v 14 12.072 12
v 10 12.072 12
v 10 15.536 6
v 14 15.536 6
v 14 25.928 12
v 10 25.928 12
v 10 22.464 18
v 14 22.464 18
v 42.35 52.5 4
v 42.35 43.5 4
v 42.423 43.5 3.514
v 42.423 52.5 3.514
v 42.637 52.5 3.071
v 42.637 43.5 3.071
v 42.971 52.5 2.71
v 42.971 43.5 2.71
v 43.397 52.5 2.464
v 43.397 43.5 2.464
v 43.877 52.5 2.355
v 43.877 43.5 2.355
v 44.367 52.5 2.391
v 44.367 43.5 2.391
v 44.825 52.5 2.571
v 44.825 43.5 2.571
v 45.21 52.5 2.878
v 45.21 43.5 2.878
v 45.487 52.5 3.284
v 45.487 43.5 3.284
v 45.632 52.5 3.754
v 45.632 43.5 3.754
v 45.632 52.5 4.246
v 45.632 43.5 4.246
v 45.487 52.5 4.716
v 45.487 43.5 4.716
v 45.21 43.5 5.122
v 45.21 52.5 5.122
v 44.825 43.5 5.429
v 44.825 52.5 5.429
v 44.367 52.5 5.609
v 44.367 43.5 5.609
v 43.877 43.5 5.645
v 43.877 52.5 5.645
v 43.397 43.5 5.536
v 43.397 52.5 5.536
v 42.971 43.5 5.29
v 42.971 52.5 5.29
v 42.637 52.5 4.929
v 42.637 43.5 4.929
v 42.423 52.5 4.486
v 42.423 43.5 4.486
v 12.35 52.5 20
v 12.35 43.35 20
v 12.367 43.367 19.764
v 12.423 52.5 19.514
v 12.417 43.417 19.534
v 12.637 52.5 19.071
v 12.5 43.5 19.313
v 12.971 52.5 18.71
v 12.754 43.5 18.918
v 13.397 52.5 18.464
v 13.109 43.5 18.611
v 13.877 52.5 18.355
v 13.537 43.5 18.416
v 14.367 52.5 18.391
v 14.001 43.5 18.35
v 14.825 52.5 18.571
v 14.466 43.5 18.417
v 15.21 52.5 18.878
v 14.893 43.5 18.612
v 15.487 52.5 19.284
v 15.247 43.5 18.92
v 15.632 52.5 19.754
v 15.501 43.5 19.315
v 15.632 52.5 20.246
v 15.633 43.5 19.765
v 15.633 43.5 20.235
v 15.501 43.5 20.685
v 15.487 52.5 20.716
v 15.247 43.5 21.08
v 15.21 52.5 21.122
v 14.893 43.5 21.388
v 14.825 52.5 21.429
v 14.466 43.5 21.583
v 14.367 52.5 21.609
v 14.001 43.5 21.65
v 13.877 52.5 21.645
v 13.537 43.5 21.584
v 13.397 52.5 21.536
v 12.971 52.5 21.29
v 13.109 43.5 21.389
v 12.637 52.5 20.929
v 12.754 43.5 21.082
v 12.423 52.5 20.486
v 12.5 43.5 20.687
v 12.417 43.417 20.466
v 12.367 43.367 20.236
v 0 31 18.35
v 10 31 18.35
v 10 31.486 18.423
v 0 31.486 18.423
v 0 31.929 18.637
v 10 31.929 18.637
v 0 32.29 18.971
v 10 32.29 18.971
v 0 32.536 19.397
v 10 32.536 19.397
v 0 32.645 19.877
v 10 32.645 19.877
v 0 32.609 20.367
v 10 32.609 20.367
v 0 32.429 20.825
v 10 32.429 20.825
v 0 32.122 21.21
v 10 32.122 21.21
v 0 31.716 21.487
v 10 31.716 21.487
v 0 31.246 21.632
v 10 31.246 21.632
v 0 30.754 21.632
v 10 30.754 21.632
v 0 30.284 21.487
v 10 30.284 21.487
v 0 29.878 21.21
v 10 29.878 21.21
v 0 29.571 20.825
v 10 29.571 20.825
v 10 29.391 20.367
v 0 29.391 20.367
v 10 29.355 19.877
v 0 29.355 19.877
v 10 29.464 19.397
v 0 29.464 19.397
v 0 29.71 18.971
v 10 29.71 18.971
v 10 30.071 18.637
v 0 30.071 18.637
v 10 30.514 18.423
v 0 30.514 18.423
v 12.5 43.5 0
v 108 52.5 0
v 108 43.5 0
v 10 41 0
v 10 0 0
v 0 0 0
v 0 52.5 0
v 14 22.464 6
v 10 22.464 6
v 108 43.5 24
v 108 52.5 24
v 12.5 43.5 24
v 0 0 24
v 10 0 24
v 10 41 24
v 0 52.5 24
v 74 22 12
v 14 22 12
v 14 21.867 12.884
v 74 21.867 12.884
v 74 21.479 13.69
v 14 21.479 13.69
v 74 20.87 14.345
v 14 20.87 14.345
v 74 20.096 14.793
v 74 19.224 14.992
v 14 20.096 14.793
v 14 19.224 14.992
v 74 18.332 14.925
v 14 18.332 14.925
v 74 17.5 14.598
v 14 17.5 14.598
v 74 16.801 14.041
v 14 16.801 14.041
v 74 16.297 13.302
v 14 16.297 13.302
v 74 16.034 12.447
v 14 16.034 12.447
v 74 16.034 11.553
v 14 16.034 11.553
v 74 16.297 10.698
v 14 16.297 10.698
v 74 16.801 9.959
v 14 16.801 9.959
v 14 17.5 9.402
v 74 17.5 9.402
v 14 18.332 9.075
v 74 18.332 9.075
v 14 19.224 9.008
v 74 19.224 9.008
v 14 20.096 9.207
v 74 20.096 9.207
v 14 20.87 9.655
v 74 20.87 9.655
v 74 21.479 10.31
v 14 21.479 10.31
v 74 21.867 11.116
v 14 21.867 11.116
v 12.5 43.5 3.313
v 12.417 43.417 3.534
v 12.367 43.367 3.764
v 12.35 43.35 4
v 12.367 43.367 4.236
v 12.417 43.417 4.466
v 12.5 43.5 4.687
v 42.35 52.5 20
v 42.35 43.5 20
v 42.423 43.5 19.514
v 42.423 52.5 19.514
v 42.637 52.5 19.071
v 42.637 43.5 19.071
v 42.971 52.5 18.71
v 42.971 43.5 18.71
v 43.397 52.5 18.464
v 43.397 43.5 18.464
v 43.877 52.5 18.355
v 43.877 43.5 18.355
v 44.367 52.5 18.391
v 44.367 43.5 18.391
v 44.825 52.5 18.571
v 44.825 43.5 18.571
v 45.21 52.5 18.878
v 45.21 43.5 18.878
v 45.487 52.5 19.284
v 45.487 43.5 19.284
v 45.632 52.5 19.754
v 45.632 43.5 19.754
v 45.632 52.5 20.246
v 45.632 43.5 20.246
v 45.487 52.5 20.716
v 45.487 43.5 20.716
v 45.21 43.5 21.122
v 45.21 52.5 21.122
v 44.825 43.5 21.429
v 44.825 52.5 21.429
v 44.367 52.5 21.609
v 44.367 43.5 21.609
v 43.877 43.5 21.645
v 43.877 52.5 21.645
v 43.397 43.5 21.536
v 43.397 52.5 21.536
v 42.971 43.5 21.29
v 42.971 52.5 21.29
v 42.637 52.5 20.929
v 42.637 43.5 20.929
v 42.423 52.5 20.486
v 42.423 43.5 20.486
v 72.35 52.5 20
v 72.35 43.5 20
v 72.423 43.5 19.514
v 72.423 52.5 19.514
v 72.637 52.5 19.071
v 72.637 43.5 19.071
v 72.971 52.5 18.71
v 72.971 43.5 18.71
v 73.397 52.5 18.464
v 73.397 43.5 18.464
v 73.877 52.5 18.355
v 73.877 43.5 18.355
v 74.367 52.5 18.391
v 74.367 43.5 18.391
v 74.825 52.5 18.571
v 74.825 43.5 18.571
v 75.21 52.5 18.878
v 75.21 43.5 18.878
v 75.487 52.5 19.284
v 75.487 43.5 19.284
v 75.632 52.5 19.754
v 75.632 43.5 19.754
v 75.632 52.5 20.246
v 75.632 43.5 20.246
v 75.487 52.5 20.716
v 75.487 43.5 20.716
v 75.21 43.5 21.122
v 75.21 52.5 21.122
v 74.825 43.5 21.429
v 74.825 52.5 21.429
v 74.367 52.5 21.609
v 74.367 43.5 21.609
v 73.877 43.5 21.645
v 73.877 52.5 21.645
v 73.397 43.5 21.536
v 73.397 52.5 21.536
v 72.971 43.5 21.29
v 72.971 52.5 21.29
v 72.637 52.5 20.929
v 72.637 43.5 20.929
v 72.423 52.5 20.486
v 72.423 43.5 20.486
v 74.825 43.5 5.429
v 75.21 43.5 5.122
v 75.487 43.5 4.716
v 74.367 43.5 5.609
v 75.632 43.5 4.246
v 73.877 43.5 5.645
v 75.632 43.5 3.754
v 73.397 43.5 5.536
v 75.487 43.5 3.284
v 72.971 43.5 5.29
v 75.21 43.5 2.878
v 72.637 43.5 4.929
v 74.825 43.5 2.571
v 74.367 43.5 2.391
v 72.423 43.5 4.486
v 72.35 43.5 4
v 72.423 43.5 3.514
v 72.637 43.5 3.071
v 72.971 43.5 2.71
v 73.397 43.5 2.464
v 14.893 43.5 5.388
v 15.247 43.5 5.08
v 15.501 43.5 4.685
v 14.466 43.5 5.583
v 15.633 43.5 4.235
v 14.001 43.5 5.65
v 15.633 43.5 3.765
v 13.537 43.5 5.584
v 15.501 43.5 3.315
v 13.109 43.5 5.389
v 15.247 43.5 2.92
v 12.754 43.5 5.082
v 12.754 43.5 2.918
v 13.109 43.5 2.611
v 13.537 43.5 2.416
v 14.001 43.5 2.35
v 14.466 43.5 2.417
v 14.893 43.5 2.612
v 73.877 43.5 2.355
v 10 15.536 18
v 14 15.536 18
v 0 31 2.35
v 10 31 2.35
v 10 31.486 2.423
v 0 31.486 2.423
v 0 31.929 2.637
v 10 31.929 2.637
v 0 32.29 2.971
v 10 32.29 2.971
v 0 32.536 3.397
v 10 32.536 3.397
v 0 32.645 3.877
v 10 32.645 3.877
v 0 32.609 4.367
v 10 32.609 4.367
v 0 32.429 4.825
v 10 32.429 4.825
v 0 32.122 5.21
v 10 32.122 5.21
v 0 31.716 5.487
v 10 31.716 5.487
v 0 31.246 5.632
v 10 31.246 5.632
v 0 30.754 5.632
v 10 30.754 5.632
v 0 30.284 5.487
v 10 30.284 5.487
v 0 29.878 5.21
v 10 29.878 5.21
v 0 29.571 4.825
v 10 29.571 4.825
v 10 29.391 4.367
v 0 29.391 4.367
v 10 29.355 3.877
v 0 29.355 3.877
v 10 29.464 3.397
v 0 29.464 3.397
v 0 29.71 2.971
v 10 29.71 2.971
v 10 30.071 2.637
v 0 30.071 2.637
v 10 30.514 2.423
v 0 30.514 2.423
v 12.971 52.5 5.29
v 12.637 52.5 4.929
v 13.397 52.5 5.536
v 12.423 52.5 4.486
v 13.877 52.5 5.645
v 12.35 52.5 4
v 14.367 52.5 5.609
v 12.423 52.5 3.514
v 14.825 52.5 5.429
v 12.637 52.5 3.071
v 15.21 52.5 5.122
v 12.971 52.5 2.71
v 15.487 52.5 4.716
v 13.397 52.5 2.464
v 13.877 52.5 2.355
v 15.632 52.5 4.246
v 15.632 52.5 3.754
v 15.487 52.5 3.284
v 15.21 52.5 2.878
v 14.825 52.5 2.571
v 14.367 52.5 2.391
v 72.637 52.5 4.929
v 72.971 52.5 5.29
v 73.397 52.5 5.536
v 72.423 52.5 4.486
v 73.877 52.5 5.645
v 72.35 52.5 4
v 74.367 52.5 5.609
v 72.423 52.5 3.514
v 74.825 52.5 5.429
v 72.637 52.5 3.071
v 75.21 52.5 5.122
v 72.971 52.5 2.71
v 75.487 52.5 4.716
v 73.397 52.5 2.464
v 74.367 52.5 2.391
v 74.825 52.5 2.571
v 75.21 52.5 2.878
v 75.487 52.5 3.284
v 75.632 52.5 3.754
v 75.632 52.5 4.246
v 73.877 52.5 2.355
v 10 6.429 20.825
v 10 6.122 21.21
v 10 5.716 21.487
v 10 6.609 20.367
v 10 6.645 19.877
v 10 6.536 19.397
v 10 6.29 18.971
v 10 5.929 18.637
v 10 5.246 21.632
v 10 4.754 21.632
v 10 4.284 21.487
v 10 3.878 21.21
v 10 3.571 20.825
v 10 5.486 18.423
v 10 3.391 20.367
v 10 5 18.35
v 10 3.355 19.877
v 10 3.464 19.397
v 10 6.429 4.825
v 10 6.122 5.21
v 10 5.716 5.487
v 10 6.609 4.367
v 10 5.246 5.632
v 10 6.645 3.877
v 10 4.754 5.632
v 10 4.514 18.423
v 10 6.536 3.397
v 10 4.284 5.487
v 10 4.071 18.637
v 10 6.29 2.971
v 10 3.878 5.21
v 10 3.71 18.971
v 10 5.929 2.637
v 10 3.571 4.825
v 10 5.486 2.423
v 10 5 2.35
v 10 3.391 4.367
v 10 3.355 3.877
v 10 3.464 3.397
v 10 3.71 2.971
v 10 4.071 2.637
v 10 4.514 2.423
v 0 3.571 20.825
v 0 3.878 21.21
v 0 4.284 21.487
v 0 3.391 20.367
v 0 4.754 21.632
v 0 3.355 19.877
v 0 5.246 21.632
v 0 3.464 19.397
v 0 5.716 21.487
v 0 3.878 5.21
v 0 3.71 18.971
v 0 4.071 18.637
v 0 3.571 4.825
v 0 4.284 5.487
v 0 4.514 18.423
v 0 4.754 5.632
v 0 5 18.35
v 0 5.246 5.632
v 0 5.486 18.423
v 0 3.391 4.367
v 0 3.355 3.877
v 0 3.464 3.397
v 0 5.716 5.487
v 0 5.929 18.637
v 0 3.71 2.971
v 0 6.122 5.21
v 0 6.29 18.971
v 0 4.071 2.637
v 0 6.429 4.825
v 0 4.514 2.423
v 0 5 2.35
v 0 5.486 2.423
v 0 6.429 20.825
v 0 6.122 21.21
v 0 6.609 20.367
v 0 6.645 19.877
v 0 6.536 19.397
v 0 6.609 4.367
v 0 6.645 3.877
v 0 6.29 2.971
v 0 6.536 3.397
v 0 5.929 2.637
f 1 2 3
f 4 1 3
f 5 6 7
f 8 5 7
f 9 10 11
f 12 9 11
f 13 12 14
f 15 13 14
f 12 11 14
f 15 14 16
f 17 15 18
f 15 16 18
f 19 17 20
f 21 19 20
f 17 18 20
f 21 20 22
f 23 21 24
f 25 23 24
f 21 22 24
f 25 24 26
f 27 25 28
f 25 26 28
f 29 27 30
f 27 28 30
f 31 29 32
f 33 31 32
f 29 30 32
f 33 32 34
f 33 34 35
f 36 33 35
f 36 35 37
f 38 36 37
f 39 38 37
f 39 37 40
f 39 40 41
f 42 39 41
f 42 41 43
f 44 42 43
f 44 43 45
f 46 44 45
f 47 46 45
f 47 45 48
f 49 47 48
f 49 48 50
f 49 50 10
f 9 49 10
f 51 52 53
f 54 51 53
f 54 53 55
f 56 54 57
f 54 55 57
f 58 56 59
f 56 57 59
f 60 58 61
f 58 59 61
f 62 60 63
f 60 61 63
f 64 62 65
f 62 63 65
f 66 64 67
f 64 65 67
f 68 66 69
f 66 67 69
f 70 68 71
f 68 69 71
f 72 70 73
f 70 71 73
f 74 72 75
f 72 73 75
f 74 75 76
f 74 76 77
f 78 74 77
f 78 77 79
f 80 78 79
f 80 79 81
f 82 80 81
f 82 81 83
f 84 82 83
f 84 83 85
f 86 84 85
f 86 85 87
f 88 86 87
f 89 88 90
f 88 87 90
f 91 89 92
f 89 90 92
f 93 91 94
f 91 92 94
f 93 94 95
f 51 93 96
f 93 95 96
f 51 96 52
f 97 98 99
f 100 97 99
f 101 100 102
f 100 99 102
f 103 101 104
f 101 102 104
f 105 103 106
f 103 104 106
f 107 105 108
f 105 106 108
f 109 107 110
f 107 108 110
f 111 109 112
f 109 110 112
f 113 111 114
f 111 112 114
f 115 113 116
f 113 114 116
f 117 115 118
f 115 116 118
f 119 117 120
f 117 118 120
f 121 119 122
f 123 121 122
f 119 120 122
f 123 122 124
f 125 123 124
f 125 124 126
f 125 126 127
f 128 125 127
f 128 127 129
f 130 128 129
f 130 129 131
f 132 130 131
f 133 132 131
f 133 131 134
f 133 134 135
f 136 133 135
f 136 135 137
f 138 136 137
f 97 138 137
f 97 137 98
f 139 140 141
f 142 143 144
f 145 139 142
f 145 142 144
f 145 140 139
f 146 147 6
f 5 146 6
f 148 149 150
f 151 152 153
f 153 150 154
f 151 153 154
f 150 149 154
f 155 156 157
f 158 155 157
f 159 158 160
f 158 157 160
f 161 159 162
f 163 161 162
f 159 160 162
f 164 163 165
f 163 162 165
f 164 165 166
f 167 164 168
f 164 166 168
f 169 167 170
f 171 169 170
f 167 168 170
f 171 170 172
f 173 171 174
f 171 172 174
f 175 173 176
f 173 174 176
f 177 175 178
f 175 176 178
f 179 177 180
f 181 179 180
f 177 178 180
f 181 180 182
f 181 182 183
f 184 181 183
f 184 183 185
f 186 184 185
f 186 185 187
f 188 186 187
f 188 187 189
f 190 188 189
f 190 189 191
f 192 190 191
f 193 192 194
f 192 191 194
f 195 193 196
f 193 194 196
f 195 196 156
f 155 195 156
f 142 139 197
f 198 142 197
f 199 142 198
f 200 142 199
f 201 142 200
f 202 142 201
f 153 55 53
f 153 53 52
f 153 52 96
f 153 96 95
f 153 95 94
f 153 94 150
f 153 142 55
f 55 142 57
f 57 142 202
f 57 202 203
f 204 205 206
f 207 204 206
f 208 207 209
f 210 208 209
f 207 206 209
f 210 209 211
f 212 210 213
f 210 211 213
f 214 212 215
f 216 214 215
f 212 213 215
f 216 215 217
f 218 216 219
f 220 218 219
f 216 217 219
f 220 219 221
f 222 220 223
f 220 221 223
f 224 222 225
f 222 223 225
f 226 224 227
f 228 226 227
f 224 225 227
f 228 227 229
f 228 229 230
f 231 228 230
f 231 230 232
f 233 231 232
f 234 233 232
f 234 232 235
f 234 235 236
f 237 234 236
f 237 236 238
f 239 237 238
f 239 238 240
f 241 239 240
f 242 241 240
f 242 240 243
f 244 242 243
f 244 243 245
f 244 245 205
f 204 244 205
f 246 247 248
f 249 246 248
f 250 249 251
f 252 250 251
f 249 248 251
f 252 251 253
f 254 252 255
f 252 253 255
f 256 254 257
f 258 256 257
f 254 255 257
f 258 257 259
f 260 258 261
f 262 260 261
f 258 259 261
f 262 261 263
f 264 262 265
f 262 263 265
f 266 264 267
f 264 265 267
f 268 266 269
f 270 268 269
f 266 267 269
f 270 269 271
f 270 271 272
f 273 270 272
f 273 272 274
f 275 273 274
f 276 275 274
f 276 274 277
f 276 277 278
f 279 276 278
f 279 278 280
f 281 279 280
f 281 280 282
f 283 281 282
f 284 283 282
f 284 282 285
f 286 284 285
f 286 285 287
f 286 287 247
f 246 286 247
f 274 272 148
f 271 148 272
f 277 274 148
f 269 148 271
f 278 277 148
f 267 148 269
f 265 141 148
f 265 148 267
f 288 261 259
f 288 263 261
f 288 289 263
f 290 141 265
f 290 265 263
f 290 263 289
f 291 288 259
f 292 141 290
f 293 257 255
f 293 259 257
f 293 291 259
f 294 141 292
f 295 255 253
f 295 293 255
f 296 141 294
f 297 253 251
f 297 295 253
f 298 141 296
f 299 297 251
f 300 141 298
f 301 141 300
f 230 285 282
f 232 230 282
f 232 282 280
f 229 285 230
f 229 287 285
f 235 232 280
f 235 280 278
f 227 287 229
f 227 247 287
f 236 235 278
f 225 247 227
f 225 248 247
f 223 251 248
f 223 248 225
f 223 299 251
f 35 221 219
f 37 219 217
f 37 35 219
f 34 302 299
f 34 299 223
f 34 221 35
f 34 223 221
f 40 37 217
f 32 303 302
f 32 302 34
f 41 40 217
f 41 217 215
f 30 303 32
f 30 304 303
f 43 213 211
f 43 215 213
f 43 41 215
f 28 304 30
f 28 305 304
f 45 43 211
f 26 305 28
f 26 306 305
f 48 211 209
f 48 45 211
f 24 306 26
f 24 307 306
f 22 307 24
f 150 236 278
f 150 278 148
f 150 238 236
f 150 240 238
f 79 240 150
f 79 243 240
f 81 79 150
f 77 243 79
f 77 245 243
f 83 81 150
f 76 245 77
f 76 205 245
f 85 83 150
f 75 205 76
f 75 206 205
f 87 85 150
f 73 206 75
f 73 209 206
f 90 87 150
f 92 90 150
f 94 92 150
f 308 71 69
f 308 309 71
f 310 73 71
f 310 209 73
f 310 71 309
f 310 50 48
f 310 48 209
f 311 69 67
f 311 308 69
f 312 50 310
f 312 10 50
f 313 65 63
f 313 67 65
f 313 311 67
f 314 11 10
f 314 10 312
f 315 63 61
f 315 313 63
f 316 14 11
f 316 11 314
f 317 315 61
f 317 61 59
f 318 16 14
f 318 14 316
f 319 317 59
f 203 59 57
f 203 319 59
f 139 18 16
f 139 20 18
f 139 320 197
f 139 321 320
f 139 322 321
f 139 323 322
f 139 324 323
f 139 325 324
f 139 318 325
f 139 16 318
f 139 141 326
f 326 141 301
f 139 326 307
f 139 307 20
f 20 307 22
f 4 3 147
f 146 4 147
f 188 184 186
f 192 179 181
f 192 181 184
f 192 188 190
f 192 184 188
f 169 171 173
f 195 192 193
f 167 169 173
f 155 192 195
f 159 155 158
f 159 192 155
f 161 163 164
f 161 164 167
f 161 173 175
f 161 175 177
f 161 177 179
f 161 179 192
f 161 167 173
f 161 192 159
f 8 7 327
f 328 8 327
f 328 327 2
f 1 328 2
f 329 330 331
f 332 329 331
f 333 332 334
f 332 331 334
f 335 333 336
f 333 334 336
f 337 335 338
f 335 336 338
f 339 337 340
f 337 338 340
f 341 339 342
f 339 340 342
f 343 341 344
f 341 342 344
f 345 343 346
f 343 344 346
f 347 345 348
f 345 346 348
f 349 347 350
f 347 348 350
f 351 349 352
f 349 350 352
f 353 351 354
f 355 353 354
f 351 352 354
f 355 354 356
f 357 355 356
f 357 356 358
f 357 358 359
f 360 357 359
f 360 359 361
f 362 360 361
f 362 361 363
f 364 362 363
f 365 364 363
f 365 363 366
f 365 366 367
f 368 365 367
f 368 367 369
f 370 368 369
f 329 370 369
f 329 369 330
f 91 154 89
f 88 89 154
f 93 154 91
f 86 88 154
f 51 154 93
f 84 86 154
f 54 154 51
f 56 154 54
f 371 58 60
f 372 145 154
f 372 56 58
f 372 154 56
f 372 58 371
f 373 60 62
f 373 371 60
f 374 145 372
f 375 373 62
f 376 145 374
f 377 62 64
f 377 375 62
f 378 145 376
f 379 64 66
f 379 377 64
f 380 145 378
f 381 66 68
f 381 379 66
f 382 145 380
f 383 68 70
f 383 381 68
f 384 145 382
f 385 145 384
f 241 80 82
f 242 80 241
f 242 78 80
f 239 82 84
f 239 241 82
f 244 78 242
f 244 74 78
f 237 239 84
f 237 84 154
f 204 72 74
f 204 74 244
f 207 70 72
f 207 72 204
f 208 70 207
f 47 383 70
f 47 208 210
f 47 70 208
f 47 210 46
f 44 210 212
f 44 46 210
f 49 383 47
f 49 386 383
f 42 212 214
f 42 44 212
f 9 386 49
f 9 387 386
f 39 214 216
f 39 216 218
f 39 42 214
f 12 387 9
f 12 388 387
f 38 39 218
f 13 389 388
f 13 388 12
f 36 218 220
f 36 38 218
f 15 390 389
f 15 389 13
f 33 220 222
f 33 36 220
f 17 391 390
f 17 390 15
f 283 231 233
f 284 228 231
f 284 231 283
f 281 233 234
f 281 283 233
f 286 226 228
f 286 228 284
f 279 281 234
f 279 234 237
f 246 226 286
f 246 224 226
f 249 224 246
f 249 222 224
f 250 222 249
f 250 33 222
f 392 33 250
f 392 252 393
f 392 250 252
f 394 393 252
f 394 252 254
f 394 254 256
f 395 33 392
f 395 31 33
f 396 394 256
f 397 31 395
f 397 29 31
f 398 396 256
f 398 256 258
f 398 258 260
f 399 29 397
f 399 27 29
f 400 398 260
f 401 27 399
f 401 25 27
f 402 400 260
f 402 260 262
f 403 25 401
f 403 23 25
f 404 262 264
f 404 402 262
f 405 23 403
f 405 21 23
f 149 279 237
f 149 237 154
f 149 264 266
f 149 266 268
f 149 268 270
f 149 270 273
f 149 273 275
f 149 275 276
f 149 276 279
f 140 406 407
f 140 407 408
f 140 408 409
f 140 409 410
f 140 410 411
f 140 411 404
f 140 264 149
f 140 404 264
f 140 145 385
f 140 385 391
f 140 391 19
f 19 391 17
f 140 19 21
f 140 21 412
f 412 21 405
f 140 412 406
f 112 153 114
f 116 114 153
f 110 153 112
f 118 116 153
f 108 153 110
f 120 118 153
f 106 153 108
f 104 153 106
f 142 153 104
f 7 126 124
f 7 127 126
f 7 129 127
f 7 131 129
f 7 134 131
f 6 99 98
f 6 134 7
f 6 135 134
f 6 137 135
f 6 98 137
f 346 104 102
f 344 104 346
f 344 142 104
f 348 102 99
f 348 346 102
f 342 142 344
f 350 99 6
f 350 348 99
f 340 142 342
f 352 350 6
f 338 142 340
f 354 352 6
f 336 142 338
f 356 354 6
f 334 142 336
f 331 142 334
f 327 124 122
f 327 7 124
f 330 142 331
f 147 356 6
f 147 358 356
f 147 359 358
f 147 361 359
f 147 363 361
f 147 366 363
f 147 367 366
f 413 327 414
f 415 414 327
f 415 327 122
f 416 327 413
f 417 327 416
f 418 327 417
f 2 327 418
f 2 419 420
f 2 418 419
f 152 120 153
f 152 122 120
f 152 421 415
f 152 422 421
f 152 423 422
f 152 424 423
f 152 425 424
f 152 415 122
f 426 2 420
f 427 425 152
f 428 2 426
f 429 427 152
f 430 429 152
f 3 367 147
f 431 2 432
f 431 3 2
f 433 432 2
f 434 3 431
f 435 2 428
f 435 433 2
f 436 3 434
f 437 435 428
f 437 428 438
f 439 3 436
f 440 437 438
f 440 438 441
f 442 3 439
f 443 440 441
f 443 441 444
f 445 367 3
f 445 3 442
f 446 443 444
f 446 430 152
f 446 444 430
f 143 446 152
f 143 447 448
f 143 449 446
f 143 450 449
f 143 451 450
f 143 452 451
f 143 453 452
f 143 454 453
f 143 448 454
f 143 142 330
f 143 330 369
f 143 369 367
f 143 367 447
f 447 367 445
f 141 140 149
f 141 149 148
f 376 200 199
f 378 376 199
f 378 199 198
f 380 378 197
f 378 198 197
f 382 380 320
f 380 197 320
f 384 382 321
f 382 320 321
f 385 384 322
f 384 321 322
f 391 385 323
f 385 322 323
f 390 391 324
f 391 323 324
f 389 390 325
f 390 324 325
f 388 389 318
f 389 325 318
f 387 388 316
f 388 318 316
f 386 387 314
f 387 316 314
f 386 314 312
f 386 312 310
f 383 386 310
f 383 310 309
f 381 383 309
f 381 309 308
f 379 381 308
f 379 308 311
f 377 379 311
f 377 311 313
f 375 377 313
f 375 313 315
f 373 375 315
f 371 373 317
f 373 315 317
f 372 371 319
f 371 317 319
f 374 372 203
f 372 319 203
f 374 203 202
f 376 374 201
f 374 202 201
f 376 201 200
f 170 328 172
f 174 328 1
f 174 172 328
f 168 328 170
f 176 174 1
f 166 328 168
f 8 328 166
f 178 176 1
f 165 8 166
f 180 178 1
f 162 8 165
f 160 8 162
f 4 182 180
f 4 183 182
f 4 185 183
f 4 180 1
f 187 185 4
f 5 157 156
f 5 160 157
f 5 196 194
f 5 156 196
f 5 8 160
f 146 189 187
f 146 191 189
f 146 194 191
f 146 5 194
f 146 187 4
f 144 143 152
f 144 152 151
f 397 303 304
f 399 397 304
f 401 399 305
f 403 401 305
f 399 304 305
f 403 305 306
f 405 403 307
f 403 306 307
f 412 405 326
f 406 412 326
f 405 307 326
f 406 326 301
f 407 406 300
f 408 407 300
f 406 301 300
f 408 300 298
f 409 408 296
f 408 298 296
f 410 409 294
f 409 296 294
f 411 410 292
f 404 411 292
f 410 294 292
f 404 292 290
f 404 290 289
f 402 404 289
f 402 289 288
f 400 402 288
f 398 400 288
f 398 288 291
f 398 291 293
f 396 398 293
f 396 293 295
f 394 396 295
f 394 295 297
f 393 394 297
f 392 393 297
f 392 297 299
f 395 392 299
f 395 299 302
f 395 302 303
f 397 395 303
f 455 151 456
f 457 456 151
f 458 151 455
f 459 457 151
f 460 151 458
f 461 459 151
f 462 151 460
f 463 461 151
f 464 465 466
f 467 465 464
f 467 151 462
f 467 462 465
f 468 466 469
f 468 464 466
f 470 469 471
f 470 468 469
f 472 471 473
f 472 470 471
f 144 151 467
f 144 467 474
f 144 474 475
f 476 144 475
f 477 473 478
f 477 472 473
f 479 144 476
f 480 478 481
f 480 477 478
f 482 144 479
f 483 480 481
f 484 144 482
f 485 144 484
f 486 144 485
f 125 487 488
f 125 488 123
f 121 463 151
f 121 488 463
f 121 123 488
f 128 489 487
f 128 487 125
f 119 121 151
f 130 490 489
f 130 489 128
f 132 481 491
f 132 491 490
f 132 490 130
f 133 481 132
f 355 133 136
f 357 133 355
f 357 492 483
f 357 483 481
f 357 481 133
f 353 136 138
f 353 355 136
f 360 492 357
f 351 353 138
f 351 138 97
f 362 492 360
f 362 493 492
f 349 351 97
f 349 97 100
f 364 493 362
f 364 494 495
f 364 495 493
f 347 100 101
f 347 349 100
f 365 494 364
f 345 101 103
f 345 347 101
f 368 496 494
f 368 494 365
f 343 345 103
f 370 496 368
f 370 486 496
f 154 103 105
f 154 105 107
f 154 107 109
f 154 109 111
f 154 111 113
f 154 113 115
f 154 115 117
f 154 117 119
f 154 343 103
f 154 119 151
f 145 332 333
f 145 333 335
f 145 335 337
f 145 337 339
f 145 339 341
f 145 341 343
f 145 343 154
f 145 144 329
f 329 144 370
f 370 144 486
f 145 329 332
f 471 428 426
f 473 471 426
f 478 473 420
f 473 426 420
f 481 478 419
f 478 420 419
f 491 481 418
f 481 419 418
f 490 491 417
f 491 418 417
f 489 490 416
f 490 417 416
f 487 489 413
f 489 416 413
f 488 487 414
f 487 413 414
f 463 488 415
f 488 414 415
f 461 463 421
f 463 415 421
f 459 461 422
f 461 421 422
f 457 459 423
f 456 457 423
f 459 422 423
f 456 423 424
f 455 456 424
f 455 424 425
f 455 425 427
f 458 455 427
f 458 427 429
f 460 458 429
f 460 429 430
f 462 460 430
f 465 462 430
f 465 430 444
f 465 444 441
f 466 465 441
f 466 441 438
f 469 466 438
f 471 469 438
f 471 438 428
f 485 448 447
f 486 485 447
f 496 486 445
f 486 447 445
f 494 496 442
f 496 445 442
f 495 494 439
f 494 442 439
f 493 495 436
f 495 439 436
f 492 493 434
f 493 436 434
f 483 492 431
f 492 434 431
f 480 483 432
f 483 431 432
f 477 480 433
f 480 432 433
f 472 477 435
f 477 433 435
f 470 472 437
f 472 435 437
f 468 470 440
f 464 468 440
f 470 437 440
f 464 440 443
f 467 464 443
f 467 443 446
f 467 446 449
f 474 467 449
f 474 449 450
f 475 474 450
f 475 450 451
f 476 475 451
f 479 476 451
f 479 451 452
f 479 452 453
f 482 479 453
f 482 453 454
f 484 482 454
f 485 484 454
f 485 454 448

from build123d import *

# Parameters (mm, degrees)
BOSS_EXTRUDE1_DEPTH       = 24
CHAMFER1_SIZE             = 2.5
BOSS_EXTRUDE2_DEPTH       = 4
SKETCH3_R                 = 3
BOSS_EXTRUDE3_DEPTH       = 60
M4X0_7_TAPPED_HOLE1_D     = 3.3
M4X0_7_TAPPED_HOLE1_DEPTH = 10.1
M4X0_7_TAPPED_HOLE1_TIP   = 0.991420021
M4X0_7_TAPPED_HOLE2_D     = 3.3
M4X0_7_TAPPED_HOLE2_DEPTH = 10.1
M4X0_7_TAPPED_HOLE2_TIP   = 0.991420021


with BuildPart() as part:
    # Sketch1 → Boss-Extrude1 (new body)
    with BuildSketch(Plane.XY):
        Polygon((0, 0), (0, 52.5), (108, 52.5), (108, 43.5), (10, 43.5), (10, 0), align=None)
    extrude(amount=BOSS_EXTRUDE1_DEPTH)

    # Chamfer1
    chamfer1_edges = [part.edges().sort_by_distance(p)[0] for p in [
        (10, 43.5, 12),
    ]]
    chamfer(chamfer1_edges, length=CHAMFER1_SIZE)

    # Sketch2 → Boss-Extrude2 (add)
    with BuildSketch(Plane(origin=(10, 0, 0), x_dir=(0, 0, -1), z_dir=(1, 0, 0))):
        Polygon((-6, 22.464101615), (-12, 25.92820323), (-18, 22.464101615), (-18, 15.535898385), (-12, 12.07179677), (-6, 15.535898385), align=None)
    extrude(amount=BOSS_EXTRUDE2_DEPTH)

    # Sketch3 → Boss-Extrude3 (add)
    with BuildSketch(Plane(origin=(14, 0, 0), x_dir=(0, 0, -1), z_dir=(1, 0, 0))):
        with Locations(Location((-12, 19, 0), (0, 0, 90))):
            Circle(SKETCH3_R)
    extrude(amount=BOSS_EXTRUDE3_DEPTH)

    # M4x0.7 Tapped Hole1
    with Locations(Plane(origin=(0, 52.5, 0), x_dir=(1, 0, 0), z_dir=(0, 1, 0))):
        with Locations((14, -4), (44, -4), (74, -4), (74, -20), (44, -20), (14, -20)):
            Hole(M4X0_7_TAPPED_HOLE1_D / 2, depth=M4X0_7_TAPPED_HOLE1_DEPTH)
            with Locations((0, 0, -(M4X0_7_TAPPED_HOLE1_DEPTH + M4X0_7_TAPPED_HOLE1_TIP / 2))):  # 118° drill point
                Cone(0, M4X0_7_TAPPED_HOLE1_D / 2, M4X0_7_TAPPED_HOLE1_TIP, mode=Mode.SUBTRACT)

    # M4x0.7 Tapped Hole2
    with Locations(Plane.ZY):
        with Locations((4, 31), (20, 31), (20, 5), (4, 5)):
            Hole(M4X0_7_TAPPED_HOLE2_D / 2, depth=M4X0_7_TAPPED_HOLE2_DEPTH)
            with Locations((0, 0, -(M4X0_7_TAPPED_HOLE2_DEPTH + M4X0_7_TAPPED_HOLE2_TIP / 2))):  # 118° drill point
                Cone(0, M4X0_7_TAPPED_HOLE2_D / 2, M4X0_7_TAPPED_HOLE2_TIP, mode=Mode.SUBTRACT)


solid = part.part
